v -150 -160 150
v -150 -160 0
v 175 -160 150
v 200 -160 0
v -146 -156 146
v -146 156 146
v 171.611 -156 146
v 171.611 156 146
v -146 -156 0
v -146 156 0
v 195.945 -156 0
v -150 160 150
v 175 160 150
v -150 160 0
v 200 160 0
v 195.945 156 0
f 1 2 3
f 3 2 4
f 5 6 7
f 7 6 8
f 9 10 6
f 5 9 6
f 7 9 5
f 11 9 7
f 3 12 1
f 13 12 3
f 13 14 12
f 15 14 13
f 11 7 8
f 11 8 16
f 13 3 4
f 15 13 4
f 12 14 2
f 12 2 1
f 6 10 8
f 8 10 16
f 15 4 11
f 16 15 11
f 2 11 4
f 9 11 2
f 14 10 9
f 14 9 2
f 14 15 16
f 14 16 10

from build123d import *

# Parameters (mm, degrees)
EXTRUDE_2_DEPTH = 160
SHELL_2_T       = -4


with BuildPart() as part:
    # 草图1 → 凸台-拉伸2 (new, symmetric)
    with BuildSketch(Plane(origin=(0, 0, 0), x_dir=(1, 0, 0), z_dir=(0, 1, 0))):
        Polygon((200, 0), (0, 0), (-150, 0), (-150, -150), (175, -150), align=None)
    extrude(amount=EXTRUDE_2_DEPTH, both=True)

    # 抽壳2
    shell_2_openings = [part.faces().sort_by_distance(p)[0] for p in [
        (25, 0, 0),
    ]]
    offset(amount=SHELL_2_T, openings=shell_2_openings, kind=Kind.INTERSECTION)


solid = part.part
